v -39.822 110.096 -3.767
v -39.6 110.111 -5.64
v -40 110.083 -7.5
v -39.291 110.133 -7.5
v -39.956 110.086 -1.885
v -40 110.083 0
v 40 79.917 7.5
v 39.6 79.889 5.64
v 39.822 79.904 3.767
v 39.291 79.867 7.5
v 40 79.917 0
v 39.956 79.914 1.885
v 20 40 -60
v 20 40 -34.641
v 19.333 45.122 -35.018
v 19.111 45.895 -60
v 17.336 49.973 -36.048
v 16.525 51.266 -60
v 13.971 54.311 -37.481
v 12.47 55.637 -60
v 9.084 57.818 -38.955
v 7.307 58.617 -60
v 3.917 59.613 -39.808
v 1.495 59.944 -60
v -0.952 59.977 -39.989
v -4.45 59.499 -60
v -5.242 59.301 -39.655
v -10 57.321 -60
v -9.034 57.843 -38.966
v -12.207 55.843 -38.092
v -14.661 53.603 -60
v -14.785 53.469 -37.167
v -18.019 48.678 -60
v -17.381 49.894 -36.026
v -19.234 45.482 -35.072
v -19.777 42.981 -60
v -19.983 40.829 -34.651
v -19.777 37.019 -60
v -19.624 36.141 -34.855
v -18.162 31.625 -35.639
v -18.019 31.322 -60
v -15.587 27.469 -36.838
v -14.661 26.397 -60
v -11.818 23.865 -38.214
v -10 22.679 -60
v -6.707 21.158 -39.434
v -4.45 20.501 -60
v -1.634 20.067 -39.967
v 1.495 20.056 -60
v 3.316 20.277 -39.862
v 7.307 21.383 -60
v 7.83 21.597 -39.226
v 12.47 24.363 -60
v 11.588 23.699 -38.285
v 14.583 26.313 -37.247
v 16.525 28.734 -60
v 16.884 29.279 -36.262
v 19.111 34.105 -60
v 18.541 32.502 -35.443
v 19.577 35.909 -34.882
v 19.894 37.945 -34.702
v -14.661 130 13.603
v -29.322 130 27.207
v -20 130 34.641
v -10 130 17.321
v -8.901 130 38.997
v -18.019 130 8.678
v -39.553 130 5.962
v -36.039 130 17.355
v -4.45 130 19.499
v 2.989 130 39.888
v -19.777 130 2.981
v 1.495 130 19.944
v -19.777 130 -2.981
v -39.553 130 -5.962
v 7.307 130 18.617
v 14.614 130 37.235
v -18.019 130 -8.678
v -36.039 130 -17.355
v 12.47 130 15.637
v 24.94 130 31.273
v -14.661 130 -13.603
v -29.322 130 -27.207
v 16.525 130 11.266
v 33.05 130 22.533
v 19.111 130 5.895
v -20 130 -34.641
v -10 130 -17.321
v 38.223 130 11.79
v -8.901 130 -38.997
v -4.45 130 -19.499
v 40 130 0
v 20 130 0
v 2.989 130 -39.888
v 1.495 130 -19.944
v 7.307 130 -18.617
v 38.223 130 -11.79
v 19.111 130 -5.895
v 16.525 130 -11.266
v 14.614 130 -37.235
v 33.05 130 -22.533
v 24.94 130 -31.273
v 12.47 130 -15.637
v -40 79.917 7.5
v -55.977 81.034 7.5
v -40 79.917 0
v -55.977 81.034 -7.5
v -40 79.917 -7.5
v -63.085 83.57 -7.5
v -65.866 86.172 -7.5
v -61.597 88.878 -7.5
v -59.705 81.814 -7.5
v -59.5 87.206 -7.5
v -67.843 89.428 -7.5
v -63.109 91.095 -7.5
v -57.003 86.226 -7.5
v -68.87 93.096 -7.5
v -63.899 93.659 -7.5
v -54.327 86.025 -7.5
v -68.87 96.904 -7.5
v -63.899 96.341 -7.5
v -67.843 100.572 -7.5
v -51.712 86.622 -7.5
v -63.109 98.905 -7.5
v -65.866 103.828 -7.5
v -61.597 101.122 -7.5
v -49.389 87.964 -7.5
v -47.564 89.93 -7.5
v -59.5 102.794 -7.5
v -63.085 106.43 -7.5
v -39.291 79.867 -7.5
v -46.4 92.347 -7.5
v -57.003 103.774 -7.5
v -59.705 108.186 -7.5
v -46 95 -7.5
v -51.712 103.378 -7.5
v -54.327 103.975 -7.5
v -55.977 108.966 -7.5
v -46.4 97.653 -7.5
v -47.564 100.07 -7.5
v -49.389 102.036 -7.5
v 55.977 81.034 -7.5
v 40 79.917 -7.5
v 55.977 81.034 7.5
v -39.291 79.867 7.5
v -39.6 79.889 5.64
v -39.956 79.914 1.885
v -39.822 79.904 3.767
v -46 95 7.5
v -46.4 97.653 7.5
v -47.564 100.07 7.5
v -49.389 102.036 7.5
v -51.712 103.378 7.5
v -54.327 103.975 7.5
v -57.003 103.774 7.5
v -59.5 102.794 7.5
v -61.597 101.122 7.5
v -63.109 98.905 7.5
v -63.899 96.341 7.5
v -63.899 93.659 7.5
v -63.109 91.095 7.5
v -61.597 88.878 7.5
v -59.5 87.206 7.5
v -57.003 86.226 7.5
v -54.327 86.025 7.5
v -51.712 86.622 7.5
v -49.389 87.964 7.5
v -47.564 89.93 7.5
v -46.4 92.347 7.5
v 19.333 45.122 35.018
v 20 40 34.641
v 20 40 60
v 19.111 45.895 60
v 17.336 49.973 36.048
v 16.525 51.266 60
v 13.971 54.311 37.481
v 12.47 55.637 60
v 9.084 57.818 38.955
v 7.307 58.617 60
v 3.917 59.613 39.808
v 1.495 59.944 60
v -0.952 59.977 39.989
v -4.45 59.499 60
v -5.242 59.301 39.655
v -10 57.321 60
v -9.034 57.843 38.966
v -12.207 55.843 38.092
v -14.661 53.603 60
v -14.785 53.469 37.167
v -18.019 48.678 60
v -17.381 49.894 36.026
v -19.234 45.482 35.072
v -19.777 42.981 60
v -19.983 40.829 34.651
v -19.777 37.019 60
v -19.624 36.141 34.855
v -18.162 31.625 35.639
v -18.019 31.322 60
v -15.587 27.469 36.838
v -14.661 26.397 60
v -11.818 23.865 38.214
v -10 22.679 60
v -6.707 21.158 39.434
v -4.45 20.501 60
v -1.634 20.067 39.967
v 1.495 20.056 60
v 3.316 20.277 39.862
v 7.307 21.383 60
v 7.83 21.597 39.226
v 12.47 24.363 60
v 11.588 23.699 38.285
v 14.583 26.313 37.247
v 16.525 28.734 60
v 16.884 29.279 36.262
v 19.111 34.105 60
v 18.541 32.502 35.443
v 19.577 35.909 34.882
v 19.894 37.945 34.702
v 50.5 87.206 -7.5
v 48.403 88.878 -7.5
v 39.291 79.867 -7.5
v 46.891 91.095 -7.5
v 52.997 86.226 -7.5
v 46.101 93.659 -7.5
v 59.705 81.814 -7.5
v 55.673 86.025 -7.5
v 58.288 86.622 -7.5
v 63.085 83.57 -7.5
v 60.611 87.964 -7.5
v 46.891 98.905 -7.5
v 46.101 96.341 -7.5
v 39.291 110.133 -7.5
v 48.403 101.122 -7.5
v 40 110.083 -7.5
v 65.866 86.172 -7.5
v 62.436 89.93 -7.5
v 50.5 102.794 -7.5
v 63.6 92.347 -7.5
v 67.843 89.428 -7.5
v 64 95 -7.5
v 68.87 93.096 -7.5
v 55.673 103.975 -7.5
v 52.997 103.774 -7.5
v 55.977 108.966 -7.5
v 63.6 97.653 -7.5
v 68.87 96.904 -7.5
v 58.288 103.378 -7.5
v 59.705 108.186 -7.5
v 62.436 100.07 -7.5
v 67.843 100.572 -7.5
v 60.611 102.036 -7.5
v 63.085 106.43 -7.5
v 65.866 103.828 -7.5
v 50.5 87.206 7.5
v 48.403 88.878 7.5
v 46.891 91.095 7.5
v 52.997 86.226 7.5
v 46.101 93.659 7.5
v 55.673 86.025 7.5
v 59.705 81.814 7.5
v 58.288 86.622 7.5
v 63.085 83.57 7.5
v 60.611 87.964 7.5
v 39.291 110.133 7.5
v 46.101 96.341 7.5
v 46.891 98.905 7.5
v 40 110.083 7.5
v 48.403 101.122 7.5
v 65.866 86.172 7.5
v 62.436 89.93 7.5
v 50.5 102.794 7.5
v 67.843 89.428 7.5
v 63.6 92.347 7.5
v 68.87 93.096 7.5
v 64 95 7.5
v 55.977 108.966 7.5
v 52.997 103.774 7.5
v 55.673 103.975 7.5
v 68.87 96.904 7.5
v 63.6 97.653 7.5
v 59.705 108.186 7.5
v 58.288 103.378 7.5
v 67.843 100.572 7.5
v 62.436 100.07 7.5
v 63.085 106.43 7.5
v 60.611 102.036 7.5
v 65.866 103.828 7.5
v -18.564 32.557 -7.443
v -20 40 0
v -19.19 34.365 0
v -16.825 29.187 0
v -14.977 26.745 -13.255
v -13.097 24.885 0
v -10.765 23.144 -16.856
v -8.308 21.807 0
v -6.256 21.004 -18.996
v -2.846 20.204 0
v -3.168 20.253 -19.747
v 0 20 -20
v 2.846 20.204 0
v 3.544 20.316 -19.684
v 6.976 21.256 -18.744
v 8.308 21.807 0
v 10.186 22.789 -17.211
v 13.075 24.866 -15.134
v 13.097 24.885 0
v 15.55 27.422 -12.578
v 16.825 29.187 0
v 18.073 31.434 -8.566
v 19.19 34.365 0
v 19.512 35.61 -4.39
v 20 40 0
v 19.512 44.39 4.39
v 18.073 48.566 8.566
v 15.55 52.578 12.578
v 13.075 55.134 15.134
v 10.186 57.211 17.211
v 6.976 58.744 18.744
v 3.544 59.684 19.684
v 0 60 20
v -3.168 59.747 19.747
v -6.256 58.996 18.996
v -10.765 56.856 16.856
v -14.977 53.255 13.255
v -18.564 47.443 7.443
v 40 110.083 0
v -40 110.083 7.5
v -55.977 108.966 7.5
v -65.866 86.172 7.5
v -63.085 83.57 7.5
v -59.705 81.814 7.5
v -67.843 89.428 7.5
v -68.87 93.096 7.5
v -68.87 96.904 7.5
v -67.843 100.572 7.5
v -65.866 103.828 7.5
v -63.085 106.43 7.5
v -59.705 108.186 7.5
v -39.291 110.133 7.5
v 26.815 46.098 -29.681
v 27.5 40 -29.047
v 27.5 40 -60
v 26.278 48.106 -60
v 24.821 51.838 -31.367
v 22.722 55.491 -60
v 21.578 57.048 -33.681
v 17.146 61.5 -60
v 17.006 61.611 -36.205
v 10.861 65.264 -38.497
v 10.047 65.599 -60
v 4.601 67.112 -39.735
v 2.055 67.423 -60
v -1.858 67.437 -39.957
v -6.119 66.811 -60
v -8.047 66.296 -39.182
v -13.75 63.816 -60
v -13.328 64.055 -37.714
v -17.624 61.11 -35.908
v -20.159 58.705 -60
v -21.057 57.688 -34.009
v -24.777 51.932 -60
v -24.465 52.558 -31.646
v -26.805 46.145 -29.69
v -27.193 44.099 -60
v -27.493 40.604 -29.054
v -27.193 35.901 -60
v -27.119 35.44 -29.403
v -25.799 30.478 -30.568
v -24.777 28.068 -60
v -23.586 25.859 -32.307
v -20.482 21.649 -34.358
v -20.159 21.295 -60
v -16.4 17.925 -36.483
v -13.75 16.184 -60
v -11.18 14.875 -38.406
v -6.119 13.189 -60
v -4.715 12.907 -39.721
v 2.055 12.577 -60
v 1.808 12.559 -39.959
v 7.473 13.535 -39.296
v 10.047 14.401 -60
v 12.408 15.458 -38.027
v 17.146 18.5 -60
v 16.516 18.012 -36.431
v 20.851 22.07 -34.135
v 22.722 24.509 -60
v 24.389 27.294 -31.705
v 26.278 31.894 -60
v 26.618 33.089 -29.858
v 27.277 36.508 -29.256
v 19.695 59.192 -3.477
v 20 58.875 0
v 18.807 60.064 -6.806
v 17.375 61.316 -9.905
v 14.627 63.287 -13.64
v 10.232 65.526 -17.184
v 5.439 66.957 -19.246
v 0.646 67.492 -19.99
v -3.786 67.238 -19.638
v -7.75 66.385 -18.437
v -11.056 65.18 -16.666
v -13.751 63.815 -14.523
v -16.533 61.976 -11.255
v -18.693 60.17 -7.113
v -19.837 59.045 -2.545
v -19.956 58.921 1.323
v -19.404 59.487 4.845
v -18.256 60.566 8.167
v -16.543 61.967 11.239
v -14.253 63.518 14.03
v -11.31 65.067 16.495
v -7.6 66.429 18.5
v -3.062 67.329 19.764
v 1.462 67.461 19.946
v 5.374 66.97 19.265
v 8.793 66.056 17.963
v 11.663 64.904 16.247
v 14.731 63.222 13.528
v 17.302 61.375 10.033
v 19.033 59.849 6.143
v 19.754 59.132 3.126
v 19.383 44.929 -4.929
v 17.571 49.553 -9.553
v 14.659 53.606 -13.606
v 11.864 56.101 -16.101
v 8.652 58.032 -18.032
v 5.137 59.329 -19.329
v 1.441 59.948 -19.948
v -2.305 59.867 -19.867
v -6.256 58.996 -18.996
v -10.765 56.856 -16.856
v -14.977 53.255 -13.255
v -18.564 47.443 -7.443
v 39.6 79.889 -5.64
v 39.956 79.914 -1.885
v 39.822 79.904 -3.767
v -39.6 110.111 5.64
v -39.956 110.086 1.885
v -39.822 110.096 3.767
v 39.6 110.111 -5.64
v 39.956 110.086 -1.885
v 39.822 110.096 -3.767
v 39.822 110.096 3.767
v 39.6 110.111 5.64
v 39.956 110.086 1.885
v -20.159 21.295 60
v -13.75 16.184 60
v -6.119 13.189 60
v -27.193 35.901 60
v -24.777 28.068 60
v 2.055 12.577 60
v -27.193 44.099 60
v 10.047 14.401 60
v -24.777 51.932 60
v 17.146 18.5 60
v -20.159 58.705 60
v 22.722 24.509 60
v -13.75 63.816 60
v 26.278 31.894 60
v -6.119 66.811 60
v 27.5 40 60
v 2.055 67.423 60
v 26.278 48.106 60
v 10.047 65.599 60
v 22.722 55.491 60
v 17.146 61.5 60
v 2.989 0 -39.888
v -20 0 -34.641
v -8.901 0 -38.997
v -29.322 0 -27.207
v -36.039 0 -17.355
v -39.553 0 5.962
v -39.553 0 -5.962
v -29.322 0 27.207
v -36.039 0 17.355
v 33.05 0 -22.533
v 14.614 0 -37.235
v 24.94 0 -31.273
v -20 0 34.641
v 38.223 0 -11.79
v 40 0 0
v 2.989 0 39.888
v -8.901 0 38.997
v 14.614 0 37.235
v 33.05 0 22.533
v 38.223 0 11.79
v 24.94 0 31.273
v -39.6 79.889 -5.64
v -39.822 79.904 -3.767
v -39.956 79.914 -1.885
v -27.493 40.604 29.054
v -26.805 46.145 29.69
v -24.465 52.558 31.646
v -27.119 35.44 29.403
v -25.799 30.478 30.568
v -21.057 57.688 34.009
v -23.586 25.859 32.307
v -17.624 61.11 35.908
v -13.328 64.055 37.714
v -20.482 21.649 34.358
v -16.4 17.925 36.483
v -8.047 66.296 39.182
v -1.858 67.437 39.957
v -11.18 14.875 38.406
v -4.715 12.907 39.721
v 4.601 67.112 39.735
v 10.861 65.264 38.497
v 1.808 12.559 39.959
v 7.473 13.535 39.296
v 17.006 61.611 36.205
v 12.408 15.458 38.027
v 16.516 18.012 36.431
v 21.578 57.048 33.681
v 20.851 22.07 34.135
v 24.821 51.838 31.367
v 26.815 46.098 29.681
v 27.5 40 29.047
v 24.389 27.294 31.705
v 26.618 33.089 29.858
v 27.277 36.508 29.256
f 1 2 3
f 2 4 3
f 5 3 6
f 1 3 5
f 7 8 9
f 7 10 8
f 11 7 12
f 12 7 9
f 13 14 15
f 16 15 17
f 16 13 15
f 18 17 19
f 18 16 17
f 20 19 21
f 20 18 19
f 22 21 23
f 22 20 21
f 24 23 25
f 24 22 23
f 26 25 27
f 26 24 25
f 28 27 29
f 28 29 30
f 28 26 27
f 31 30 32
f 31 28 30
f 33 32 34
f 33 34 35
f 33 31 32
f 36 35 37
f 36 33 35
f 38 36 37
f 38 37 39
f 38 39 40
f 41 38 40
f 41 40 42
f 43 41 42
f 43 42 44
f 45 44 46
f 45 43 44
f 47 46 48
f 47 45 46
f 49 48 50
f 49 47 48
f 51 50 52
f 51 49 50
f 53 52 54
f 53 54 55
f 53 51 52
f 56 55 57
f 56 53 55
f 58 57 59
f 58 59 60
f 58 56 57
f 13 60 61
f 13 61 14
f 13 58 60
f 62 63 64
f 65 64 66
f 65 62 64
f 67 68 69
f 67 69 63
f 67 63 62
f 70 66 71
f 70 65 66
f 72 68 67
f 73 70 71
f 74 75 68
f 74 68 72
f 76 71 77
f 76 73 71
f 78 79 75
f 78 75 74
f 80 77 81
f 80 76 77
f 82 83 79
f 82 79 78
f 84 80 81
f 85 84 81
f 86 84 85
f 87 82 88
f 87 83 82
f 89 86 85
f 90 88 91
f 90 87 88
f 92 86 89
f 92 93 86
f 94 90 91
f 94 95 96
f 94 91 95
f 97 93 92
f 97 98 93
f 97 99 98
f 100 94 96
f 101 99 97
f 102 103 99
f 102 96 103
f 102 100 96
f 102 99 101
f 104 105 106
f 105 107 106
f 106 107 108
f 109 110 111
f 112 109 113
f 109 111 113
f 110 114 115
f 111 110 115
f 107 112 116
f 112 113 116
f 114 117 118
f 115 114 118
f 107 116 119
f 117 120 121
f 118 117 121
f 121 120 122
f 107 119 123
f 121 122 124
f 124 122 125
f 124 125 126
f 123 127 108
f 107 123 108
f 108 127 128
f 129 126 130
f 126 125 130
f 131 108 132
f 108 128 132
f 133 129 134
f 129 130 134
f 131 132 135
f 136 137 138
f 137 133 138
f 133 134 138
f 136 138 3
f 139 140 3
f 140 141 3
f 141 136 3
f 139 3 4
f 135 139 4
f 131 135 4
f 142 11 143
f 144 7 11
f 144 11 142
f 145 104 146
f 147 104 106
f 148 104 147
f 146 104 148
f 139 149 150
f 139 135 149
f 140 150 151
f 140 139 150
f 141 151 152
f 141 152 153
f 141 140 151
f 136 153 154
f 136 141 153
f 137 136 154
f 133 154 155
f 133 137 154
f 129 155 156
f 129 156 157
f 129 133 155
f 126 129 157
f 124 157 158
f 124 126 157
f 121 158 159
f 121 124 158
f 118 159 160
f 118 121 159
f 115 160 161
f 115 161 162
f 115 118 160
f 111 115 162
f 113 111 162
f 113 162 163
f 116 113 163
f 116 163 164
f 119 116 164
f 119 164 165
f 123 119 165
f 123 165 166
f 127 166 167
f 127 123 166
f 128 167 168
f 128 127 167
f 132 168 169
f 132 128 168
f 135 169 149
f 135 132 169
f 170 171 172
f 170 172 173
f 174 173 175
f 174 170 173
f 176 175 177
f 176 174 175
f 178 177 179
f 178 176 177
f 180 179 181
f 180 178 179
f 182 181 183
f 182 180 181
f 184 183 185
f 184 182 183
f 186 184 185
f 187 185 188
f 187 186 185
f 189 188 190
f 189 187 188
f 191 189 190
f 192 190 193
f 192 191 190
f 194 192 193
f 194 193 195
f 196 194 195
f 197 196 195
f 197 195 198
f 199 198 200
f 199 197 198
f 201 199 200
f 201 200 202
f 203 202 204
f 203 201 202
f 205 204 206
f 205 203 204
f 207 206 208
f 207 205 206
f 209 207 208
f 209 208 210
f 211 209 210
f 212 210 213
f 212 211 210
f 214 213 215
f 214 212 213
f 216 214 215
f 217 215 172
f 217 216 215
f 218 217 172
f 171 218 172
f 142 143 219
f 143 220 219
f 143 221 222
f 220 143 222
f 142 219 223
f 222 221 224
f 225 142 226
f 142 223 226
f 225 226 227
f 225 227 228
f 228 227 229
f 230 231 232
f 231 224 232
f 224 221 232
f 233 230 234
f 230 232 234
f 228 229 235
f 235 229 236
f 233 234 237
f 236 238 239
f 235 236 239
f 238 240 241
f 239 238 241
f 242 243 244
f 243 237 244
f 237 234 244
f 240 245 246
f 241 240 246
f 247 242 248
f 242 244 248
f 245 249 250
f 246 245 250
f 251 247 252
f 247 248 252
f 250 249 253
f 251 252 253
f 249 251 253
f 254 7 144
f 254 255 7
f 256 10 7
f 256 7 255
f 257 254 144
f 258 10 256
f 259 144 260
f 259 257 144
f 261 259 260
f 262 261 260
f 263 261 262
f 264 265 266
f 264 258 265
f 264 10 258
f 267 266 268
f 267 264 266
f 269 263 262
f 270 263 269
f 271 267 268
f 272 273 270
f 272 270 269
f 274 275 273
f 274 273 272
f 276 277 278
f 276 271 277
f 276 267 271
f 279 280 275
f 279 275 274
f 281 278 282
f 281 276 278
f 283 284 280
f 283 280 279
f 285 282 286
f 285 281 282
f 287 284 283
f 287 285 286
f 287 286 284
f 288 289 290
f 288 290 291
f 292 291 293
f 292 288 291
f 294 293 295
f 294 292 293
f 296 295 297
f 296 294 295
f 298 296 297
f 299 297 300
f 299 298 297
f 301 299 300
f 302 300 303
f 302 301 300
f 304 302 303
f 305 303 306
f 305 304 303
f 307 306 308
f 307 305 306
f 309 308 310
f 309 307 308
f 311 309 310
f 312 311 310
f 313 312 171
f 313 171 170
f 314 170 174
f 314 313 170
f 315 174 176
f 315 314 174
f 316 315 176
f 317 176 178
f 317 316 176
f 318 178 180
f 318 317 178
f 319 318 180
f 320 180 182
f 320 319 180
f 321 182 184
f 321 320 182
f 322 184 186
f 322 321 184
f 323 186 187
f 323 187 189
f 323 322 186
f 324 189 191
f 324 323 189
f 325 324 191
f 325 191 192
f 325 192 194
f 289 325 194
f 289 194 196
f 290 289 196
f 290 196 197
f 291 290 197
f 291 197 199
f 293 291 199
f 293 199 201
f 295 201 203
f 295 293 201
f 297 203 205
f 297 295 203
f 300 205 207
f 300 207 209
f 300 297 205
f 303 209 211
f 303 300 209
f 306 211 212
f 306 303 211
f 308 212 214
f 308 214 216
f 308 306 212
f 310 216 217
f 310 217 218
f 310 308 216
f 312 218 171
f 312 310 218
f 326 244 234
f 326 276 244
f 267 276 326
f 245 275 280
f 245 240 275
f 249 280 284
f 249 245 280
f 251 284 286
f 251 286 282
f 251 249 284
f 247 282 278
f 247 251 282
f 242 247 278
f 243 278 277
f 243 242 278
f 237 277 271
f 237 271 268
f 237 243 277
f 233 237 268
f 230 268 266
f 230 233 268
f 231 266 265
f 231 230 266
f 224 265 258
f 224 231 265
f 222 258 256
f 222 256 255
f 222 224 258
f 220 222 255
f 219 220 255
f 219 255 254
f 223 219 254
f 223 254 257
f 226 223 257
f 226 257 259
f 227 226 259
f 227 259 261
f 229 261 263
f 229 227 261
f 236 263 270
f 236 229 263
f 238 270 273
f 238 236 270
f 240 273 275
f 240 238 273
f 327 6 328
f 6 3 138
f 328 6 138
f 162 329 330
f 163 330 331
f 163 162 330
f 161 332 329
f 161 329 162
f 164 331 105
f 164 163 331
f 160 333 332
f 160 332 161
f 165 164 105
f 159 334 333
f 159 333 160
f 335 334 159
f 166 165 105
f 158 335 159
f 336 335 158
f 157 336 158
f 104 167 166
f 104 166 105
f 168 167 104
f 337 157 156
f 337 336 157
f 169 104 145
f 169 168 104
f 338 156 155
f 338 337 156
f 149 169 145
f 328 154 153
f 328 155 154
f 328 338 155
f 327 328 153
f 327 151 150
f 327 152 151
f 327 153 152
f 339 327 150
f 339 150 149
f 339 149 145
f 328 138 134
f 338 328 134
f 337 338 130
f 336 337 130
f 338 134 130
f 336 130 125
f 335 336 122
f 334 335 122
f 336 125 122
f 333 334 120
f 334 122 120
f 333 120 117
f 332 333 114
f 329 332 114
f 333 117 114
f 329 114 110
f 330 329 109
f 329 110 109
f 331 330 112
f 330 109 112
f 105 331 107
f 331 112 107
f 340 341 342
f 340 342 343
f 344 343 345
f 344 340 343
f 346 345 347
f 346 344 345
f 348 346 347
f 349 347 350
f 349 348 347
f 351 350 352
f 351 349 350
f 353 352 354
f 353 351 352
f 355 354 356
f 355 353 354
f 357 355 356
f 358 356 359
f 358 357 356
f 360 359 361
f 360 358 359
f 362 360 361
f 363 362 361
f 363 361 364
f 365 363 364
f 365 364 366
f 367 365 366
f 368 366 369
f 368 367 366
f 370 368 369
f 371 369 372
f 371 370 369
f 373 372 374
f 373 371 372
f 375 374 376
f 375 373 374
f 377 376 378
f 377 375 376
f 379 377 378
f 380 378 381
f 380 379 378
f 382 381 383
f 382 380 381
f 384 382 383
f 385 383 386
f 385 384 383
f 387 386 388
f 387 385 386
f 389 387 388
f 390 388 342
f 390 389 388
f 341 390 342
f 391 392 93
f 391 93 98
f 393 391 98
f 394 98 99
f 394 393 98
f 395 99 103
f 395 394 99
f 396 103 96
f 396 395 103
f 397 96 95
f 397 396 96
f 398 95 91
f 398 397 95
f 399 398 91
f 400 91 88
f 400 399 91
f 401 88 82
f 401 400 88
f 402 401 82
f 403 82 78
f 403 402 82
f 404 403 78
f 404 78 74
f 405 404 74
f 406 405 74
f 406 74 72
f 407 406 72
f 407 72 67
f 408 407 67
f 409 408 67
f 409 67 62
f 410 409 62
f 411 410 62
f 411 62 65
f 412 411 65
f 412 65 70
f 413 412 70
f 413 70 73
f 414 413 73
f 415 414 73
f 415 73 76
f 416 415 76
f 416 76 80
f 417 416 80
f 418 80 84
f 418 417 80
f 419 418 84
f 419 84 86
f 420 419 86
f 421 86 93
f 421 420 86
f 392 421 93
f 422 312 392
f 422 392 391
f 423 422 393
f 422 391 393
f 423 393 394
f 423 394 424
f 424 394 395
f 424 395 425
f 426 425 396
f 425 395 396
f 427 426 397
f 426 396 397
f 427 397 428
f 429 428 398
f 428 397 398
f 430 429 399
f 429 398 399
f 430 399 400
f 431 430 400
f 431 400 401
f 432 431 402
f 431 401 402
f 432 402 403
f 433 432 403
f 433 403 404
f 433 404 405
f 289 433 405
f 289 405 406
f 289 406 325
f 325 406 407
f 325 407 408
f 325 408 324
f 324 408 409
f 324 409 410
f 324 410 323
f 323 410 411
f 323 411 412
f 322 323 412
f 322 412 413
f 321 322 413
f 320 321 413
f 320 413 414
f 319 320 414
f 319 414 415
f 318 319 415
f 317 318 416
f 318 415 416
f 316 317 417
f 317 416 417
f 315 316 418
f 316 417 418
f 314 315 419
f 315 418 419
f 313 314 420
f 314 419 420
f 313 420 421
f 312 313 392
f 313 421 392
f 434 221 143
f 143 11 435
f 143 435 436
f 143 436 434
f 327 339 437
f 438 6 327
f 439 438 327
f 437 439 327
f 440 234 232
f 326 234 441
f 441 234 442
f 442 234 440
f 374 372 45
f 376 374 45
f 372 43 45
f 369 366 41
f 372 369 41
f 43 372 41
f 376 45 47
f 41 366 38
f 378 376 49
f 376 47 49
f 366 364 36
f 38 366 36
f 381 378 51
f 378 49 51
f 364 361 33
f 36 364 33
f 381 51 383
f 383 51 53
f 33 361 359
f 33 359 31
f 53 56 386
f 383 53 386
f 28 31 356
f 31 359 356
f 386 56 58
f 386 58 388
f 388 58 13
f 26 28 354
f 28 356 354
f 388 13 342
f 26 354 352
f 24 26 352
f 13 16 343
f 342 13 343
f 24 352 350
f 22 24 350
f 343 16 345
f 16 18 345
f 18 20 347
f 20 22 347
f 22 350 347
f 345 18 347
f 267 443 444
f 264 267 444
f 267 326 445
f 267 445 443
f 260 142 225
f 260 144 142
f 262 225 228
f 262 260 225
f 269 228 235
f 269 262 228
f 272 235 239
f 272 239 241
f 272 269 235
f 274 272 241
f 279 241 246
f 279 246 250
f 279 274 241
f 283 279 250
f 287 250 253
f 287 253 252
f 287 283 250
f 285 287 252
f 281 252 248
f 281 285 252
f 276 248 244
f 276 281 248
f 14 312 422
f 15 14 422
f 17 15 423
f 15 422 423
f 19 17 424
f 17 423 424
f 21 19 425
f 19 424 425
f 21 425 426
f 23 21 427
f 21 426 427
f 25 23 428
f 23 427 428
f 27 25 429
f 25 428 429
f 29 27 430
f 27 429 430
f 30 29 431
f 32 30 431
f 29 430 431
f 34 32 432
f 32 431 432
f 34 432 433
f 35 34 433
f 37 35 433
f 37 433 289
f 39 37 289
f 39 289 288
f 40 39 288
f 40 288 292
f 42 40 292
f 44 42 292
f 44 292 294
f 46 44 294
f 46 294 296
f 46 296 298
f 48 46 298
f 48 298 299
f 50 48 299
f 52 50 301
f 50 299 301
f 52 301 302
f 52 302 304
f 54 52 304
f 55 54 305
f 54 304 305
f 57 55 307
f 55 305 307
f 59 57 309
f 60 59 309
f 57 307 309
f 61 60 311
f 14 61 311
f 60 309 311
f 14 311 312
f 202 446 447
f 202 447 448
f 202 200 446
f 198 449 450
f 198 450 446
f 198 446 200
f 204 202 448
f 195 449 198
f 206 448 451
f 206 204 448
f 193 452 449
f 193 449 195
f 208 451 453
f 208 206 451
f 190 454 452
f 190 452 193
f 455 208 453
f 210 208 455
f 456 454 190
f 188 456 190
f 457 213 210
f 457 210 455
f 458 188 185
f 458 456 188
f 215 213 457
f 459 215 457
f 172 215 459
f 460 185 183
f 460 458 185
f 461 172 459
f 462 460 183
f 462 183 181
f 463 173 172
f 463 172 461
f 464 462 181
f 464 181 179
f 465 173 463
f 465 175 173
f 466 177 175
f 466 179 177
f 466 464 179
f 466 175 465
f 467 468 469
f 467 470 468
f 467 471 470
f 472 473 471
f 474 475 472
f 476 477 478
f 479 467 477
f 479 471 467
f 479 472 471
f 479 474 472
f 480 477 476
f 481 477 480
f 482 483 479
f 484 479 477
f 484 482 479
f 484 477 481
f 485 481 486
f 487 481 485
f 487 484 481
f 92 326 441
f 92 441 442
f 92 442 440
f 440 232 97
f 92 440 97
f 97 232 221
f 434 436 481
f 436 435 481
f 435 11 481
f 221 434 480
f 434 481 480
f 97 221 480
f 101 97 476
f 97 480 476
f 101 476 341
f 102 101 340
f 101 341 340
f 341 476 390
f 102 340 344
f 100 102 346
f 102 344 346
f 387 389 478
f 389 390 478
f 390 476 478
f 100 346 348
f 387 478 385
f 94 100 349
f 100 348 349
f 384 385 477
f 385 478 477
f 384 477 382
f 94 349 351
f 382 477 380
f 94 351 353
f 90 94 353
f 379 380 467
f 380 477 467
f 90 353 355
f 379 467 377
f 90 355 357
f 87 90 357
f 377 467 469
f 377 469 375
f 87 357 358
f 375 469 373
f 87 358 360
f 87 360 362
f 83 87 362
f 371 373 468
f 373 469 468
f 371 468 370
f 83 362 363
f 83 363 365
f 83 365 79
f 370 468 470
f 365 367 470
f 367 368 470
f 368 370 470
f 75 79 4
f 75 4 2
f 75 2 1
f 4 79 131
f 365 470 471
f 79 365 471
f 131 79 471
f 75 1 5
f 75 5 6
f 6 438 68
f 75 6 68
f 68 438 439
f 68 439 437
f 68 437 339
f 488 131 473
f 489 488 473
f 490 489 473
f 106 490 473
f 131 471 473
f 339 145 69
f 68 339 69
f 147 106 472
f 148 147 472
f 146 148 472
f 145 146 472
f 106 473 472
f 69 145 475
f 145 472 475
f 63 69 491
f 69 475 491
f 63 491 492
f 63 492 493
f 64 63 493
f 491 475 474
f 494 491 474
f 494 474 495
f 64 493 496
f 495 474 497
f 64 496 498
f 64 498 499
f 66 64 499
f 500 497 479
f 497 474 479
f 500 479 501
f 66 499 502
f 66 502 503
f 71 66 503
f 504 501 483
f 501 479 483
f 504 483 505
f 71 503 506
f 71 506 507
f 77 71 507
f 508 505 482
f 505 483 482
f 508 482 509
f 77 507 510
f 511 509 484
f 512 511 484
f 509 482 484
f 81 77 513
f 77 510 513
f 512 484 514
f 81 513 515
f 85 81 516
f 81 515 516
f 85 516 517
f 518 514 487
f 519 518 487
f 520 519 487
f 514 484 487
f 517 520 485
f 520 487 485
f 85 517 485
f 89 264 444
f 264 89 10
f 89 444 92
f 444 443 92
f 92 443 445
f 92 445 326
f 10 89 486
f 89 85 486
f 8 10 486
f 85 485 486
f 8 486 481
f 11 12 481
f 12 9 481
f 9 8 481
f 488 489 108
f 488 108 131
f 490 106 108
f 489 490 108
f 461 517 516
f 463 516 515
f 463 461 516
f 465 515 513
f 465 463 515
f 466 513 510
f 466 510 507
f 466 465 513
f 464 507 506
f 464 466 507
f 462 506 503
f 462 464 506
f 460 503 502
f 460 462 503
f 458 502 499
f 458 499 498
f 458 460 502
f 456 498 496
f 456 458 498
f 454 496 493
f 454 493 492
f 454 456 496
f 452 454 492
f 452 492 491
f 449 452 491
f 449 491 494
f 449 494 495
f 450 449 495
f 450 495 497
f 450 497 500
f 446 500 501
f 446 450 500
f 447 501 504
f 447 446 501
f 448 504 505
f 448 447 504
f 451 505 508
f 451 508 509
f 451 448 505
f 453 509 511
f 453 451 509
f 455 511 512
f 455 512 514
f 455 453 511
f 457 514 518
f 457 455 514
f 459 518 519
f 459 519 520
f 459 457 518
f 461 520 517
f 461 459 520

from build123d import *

# Parameters (mm, degrees)
SKETCH1_R                      = 40
SKETCH1_R_2                    = 20
BOSS_EXTRUDE1_DEPTH            = 130
SKETCH2_R                      = 27.5
SKETCH2_R_2                    = 20
BOSS_EXTRUDE2_DEPTH            = 60
SKETCH2_2_R                    = 20
CUT_EXTRUDE1_DEPTH             = 61.0000001
CUT_EXTRUDE1_DEPTH_BACK        = 61.0000001
SKETCH3_R                      = 14
SKETCH3_R_2                    = 9
BOSS_EXTRUDE3_DEPTH            = 7.5
CUT_EXTRUDE2_REACH             = 132
SKETCH4_R                      = 20
CUT_EXTRUDE2_DIRECTION_2_DEPTH = 1.0000001
BOSS_EXTRUDE4_REACH            = 132
SKETCH5_R                      = 20


with BuildPart() as part:
    # Sketch1 → Boss-Extrude1 (new body)
    with BuildSketch(Plane(origin=(0, 0, 0), x_dir=(1, 0, 0), z_dir=(0, 1, 0))):
        Circle(SKETCH1_R)
        Circle(SKETCH1_R_2, mode=Mode.SUBTRACT)
    extrude(amount=BOSS_EXTRUDE1_DEPTH)

    # Sketch2 → Boss-Extrude2 (add, symmetric)
    with BuildSketch(Plane.XY):
        with Locations((0, 40)):
            Circle(SKETCH2_R)
        with Locations((0, 40)):
            Circle(SKETCH2_R_2, mode=Mode.SUBTRACT)
    extrude(amount=BOSS_EXTRUDE2_DEPTH, both=True)

    # Sketch2<2> → Cut-Extrude1 (cut, two sides)
    with BuildSketch(Plane.XY) as cut_extrude1_sk:
        with Locations((0, 40)):
            Circle(SKETCH2_2_R)
    extrude(amount=CUT_EXTRUDE1_DEPTH, mode=Mode.SUBTRACT)
    extrude(cut_extrude1_sk.sketch, amount=-CUT_EXTRUDE1_DEPTH_BACK, mode=Mode.SUBTRACT)

    # Sketch3 → Boss-Extrude3 (add, symmetric)
    with BuildSketch(Plane.XY):
        with Locations((-55, 95)):
            Circle(SKETCH3_R)
        with Locations((-55, 95)):
            Circle(SKETCH3_R_2, mode=Mode.SUBTRACT)
        with BuildLine():
            Line((-25, 111.131990931), (-40, 110.083088752))
            Line((-40, 110.083088752), (-55.976590632, 108.965896704))
            ThreePointArc((-55.976590632, 108.965896704), (-45.452022959, 105.238951823), (-41, 95))
            ThreePointArc((-41, 95), (-45.452022959, 84.761048177), (-55.976590632, 81.034103296))
            Line((-55.976590632, 81.034103296), (-40, 79.916911248))
            Line((-40, 79.916911248), (-25, 78.868009069))
            Line((-25, 78.868009069), (-25, 111.131990931))
        make_face()
        with Locations((55, 95)):
            Circle(SKETCH3_R)
        with Locations((55, 95)):
            Circle(SKETCH3_R_2, mode=Mode.SUBTRACT)
        with BuildLine():
            Line((55.976590632, 108.965896704), (40, 110.083088752))
            Line((40, 110.083088752), (25, 111.131990931))
            Line((25, 111.131990931), (25, 78.868009069))
            Line((25, 78.868009069), (40, 79.916911248))
            Line((40, 79.916911248), (55.976590632, 81.034103296))
            ThreePointArc((55.976590632, 81.034103296), (41, 95), (55.976590632, 108.965896704))
        make_face()
    extrude(amount=BOSS_EXTRUDE3_DEPTH, both=True)

    # Sketch4 → Cut-Extrude2 (cut, up to next)
    with BuildSketch(Plane(origin=(0, 130, 0), x_dir=(1, 0, 0), z_dir=(0, 1, 0)), mode=Mode.PRIVATE) as cut_extrude2_sk1:
        Circle(SKETCH4_R)
    cut_extrude2_tool1 = extrude(cut_extrude2_sk1.sketch, amount=-CUT_EXTRUDE2_REACH, mode=Mode.PRIVATE) & part.part
    add(cut_extrude2_tool1.solids().sort_by_distance((0, 130, 0))[0], mode=Mode.SUBTRACT)

    # Sketch4 → Cut-Extrude2 direction 2 (cut)
    with BuildSketch(Plane(origin=(0, 130, 0), x_dir=(1, 0, 0), z_dir=(0, 1, 0))):
        Circle(SKETCH4_R)
    extrude(amount=CUT_EXTRUDE2_DIRECTION_2_DEPTH, mode=Mode.SUBTRACT)

    # Sketch5 → Boss-Extrude4 (add, up to next)
    with BuildSketch(Plane.XZ, mode=Mode.PRIVATE) as boss_extrude4_sk1:
        Circle(SKETCH5_R)
    boss_extrude4_tool1 = extrude(boss_extrude4_sk1.sketch, amount=-BOSS_EXTRUDE4_REACH, mode=Mode.PRIVATE) - part.part
    add(boss_extrude4_tool1.solids().sort_by_distance((0, 0, 0))[0])


solid = part.part
